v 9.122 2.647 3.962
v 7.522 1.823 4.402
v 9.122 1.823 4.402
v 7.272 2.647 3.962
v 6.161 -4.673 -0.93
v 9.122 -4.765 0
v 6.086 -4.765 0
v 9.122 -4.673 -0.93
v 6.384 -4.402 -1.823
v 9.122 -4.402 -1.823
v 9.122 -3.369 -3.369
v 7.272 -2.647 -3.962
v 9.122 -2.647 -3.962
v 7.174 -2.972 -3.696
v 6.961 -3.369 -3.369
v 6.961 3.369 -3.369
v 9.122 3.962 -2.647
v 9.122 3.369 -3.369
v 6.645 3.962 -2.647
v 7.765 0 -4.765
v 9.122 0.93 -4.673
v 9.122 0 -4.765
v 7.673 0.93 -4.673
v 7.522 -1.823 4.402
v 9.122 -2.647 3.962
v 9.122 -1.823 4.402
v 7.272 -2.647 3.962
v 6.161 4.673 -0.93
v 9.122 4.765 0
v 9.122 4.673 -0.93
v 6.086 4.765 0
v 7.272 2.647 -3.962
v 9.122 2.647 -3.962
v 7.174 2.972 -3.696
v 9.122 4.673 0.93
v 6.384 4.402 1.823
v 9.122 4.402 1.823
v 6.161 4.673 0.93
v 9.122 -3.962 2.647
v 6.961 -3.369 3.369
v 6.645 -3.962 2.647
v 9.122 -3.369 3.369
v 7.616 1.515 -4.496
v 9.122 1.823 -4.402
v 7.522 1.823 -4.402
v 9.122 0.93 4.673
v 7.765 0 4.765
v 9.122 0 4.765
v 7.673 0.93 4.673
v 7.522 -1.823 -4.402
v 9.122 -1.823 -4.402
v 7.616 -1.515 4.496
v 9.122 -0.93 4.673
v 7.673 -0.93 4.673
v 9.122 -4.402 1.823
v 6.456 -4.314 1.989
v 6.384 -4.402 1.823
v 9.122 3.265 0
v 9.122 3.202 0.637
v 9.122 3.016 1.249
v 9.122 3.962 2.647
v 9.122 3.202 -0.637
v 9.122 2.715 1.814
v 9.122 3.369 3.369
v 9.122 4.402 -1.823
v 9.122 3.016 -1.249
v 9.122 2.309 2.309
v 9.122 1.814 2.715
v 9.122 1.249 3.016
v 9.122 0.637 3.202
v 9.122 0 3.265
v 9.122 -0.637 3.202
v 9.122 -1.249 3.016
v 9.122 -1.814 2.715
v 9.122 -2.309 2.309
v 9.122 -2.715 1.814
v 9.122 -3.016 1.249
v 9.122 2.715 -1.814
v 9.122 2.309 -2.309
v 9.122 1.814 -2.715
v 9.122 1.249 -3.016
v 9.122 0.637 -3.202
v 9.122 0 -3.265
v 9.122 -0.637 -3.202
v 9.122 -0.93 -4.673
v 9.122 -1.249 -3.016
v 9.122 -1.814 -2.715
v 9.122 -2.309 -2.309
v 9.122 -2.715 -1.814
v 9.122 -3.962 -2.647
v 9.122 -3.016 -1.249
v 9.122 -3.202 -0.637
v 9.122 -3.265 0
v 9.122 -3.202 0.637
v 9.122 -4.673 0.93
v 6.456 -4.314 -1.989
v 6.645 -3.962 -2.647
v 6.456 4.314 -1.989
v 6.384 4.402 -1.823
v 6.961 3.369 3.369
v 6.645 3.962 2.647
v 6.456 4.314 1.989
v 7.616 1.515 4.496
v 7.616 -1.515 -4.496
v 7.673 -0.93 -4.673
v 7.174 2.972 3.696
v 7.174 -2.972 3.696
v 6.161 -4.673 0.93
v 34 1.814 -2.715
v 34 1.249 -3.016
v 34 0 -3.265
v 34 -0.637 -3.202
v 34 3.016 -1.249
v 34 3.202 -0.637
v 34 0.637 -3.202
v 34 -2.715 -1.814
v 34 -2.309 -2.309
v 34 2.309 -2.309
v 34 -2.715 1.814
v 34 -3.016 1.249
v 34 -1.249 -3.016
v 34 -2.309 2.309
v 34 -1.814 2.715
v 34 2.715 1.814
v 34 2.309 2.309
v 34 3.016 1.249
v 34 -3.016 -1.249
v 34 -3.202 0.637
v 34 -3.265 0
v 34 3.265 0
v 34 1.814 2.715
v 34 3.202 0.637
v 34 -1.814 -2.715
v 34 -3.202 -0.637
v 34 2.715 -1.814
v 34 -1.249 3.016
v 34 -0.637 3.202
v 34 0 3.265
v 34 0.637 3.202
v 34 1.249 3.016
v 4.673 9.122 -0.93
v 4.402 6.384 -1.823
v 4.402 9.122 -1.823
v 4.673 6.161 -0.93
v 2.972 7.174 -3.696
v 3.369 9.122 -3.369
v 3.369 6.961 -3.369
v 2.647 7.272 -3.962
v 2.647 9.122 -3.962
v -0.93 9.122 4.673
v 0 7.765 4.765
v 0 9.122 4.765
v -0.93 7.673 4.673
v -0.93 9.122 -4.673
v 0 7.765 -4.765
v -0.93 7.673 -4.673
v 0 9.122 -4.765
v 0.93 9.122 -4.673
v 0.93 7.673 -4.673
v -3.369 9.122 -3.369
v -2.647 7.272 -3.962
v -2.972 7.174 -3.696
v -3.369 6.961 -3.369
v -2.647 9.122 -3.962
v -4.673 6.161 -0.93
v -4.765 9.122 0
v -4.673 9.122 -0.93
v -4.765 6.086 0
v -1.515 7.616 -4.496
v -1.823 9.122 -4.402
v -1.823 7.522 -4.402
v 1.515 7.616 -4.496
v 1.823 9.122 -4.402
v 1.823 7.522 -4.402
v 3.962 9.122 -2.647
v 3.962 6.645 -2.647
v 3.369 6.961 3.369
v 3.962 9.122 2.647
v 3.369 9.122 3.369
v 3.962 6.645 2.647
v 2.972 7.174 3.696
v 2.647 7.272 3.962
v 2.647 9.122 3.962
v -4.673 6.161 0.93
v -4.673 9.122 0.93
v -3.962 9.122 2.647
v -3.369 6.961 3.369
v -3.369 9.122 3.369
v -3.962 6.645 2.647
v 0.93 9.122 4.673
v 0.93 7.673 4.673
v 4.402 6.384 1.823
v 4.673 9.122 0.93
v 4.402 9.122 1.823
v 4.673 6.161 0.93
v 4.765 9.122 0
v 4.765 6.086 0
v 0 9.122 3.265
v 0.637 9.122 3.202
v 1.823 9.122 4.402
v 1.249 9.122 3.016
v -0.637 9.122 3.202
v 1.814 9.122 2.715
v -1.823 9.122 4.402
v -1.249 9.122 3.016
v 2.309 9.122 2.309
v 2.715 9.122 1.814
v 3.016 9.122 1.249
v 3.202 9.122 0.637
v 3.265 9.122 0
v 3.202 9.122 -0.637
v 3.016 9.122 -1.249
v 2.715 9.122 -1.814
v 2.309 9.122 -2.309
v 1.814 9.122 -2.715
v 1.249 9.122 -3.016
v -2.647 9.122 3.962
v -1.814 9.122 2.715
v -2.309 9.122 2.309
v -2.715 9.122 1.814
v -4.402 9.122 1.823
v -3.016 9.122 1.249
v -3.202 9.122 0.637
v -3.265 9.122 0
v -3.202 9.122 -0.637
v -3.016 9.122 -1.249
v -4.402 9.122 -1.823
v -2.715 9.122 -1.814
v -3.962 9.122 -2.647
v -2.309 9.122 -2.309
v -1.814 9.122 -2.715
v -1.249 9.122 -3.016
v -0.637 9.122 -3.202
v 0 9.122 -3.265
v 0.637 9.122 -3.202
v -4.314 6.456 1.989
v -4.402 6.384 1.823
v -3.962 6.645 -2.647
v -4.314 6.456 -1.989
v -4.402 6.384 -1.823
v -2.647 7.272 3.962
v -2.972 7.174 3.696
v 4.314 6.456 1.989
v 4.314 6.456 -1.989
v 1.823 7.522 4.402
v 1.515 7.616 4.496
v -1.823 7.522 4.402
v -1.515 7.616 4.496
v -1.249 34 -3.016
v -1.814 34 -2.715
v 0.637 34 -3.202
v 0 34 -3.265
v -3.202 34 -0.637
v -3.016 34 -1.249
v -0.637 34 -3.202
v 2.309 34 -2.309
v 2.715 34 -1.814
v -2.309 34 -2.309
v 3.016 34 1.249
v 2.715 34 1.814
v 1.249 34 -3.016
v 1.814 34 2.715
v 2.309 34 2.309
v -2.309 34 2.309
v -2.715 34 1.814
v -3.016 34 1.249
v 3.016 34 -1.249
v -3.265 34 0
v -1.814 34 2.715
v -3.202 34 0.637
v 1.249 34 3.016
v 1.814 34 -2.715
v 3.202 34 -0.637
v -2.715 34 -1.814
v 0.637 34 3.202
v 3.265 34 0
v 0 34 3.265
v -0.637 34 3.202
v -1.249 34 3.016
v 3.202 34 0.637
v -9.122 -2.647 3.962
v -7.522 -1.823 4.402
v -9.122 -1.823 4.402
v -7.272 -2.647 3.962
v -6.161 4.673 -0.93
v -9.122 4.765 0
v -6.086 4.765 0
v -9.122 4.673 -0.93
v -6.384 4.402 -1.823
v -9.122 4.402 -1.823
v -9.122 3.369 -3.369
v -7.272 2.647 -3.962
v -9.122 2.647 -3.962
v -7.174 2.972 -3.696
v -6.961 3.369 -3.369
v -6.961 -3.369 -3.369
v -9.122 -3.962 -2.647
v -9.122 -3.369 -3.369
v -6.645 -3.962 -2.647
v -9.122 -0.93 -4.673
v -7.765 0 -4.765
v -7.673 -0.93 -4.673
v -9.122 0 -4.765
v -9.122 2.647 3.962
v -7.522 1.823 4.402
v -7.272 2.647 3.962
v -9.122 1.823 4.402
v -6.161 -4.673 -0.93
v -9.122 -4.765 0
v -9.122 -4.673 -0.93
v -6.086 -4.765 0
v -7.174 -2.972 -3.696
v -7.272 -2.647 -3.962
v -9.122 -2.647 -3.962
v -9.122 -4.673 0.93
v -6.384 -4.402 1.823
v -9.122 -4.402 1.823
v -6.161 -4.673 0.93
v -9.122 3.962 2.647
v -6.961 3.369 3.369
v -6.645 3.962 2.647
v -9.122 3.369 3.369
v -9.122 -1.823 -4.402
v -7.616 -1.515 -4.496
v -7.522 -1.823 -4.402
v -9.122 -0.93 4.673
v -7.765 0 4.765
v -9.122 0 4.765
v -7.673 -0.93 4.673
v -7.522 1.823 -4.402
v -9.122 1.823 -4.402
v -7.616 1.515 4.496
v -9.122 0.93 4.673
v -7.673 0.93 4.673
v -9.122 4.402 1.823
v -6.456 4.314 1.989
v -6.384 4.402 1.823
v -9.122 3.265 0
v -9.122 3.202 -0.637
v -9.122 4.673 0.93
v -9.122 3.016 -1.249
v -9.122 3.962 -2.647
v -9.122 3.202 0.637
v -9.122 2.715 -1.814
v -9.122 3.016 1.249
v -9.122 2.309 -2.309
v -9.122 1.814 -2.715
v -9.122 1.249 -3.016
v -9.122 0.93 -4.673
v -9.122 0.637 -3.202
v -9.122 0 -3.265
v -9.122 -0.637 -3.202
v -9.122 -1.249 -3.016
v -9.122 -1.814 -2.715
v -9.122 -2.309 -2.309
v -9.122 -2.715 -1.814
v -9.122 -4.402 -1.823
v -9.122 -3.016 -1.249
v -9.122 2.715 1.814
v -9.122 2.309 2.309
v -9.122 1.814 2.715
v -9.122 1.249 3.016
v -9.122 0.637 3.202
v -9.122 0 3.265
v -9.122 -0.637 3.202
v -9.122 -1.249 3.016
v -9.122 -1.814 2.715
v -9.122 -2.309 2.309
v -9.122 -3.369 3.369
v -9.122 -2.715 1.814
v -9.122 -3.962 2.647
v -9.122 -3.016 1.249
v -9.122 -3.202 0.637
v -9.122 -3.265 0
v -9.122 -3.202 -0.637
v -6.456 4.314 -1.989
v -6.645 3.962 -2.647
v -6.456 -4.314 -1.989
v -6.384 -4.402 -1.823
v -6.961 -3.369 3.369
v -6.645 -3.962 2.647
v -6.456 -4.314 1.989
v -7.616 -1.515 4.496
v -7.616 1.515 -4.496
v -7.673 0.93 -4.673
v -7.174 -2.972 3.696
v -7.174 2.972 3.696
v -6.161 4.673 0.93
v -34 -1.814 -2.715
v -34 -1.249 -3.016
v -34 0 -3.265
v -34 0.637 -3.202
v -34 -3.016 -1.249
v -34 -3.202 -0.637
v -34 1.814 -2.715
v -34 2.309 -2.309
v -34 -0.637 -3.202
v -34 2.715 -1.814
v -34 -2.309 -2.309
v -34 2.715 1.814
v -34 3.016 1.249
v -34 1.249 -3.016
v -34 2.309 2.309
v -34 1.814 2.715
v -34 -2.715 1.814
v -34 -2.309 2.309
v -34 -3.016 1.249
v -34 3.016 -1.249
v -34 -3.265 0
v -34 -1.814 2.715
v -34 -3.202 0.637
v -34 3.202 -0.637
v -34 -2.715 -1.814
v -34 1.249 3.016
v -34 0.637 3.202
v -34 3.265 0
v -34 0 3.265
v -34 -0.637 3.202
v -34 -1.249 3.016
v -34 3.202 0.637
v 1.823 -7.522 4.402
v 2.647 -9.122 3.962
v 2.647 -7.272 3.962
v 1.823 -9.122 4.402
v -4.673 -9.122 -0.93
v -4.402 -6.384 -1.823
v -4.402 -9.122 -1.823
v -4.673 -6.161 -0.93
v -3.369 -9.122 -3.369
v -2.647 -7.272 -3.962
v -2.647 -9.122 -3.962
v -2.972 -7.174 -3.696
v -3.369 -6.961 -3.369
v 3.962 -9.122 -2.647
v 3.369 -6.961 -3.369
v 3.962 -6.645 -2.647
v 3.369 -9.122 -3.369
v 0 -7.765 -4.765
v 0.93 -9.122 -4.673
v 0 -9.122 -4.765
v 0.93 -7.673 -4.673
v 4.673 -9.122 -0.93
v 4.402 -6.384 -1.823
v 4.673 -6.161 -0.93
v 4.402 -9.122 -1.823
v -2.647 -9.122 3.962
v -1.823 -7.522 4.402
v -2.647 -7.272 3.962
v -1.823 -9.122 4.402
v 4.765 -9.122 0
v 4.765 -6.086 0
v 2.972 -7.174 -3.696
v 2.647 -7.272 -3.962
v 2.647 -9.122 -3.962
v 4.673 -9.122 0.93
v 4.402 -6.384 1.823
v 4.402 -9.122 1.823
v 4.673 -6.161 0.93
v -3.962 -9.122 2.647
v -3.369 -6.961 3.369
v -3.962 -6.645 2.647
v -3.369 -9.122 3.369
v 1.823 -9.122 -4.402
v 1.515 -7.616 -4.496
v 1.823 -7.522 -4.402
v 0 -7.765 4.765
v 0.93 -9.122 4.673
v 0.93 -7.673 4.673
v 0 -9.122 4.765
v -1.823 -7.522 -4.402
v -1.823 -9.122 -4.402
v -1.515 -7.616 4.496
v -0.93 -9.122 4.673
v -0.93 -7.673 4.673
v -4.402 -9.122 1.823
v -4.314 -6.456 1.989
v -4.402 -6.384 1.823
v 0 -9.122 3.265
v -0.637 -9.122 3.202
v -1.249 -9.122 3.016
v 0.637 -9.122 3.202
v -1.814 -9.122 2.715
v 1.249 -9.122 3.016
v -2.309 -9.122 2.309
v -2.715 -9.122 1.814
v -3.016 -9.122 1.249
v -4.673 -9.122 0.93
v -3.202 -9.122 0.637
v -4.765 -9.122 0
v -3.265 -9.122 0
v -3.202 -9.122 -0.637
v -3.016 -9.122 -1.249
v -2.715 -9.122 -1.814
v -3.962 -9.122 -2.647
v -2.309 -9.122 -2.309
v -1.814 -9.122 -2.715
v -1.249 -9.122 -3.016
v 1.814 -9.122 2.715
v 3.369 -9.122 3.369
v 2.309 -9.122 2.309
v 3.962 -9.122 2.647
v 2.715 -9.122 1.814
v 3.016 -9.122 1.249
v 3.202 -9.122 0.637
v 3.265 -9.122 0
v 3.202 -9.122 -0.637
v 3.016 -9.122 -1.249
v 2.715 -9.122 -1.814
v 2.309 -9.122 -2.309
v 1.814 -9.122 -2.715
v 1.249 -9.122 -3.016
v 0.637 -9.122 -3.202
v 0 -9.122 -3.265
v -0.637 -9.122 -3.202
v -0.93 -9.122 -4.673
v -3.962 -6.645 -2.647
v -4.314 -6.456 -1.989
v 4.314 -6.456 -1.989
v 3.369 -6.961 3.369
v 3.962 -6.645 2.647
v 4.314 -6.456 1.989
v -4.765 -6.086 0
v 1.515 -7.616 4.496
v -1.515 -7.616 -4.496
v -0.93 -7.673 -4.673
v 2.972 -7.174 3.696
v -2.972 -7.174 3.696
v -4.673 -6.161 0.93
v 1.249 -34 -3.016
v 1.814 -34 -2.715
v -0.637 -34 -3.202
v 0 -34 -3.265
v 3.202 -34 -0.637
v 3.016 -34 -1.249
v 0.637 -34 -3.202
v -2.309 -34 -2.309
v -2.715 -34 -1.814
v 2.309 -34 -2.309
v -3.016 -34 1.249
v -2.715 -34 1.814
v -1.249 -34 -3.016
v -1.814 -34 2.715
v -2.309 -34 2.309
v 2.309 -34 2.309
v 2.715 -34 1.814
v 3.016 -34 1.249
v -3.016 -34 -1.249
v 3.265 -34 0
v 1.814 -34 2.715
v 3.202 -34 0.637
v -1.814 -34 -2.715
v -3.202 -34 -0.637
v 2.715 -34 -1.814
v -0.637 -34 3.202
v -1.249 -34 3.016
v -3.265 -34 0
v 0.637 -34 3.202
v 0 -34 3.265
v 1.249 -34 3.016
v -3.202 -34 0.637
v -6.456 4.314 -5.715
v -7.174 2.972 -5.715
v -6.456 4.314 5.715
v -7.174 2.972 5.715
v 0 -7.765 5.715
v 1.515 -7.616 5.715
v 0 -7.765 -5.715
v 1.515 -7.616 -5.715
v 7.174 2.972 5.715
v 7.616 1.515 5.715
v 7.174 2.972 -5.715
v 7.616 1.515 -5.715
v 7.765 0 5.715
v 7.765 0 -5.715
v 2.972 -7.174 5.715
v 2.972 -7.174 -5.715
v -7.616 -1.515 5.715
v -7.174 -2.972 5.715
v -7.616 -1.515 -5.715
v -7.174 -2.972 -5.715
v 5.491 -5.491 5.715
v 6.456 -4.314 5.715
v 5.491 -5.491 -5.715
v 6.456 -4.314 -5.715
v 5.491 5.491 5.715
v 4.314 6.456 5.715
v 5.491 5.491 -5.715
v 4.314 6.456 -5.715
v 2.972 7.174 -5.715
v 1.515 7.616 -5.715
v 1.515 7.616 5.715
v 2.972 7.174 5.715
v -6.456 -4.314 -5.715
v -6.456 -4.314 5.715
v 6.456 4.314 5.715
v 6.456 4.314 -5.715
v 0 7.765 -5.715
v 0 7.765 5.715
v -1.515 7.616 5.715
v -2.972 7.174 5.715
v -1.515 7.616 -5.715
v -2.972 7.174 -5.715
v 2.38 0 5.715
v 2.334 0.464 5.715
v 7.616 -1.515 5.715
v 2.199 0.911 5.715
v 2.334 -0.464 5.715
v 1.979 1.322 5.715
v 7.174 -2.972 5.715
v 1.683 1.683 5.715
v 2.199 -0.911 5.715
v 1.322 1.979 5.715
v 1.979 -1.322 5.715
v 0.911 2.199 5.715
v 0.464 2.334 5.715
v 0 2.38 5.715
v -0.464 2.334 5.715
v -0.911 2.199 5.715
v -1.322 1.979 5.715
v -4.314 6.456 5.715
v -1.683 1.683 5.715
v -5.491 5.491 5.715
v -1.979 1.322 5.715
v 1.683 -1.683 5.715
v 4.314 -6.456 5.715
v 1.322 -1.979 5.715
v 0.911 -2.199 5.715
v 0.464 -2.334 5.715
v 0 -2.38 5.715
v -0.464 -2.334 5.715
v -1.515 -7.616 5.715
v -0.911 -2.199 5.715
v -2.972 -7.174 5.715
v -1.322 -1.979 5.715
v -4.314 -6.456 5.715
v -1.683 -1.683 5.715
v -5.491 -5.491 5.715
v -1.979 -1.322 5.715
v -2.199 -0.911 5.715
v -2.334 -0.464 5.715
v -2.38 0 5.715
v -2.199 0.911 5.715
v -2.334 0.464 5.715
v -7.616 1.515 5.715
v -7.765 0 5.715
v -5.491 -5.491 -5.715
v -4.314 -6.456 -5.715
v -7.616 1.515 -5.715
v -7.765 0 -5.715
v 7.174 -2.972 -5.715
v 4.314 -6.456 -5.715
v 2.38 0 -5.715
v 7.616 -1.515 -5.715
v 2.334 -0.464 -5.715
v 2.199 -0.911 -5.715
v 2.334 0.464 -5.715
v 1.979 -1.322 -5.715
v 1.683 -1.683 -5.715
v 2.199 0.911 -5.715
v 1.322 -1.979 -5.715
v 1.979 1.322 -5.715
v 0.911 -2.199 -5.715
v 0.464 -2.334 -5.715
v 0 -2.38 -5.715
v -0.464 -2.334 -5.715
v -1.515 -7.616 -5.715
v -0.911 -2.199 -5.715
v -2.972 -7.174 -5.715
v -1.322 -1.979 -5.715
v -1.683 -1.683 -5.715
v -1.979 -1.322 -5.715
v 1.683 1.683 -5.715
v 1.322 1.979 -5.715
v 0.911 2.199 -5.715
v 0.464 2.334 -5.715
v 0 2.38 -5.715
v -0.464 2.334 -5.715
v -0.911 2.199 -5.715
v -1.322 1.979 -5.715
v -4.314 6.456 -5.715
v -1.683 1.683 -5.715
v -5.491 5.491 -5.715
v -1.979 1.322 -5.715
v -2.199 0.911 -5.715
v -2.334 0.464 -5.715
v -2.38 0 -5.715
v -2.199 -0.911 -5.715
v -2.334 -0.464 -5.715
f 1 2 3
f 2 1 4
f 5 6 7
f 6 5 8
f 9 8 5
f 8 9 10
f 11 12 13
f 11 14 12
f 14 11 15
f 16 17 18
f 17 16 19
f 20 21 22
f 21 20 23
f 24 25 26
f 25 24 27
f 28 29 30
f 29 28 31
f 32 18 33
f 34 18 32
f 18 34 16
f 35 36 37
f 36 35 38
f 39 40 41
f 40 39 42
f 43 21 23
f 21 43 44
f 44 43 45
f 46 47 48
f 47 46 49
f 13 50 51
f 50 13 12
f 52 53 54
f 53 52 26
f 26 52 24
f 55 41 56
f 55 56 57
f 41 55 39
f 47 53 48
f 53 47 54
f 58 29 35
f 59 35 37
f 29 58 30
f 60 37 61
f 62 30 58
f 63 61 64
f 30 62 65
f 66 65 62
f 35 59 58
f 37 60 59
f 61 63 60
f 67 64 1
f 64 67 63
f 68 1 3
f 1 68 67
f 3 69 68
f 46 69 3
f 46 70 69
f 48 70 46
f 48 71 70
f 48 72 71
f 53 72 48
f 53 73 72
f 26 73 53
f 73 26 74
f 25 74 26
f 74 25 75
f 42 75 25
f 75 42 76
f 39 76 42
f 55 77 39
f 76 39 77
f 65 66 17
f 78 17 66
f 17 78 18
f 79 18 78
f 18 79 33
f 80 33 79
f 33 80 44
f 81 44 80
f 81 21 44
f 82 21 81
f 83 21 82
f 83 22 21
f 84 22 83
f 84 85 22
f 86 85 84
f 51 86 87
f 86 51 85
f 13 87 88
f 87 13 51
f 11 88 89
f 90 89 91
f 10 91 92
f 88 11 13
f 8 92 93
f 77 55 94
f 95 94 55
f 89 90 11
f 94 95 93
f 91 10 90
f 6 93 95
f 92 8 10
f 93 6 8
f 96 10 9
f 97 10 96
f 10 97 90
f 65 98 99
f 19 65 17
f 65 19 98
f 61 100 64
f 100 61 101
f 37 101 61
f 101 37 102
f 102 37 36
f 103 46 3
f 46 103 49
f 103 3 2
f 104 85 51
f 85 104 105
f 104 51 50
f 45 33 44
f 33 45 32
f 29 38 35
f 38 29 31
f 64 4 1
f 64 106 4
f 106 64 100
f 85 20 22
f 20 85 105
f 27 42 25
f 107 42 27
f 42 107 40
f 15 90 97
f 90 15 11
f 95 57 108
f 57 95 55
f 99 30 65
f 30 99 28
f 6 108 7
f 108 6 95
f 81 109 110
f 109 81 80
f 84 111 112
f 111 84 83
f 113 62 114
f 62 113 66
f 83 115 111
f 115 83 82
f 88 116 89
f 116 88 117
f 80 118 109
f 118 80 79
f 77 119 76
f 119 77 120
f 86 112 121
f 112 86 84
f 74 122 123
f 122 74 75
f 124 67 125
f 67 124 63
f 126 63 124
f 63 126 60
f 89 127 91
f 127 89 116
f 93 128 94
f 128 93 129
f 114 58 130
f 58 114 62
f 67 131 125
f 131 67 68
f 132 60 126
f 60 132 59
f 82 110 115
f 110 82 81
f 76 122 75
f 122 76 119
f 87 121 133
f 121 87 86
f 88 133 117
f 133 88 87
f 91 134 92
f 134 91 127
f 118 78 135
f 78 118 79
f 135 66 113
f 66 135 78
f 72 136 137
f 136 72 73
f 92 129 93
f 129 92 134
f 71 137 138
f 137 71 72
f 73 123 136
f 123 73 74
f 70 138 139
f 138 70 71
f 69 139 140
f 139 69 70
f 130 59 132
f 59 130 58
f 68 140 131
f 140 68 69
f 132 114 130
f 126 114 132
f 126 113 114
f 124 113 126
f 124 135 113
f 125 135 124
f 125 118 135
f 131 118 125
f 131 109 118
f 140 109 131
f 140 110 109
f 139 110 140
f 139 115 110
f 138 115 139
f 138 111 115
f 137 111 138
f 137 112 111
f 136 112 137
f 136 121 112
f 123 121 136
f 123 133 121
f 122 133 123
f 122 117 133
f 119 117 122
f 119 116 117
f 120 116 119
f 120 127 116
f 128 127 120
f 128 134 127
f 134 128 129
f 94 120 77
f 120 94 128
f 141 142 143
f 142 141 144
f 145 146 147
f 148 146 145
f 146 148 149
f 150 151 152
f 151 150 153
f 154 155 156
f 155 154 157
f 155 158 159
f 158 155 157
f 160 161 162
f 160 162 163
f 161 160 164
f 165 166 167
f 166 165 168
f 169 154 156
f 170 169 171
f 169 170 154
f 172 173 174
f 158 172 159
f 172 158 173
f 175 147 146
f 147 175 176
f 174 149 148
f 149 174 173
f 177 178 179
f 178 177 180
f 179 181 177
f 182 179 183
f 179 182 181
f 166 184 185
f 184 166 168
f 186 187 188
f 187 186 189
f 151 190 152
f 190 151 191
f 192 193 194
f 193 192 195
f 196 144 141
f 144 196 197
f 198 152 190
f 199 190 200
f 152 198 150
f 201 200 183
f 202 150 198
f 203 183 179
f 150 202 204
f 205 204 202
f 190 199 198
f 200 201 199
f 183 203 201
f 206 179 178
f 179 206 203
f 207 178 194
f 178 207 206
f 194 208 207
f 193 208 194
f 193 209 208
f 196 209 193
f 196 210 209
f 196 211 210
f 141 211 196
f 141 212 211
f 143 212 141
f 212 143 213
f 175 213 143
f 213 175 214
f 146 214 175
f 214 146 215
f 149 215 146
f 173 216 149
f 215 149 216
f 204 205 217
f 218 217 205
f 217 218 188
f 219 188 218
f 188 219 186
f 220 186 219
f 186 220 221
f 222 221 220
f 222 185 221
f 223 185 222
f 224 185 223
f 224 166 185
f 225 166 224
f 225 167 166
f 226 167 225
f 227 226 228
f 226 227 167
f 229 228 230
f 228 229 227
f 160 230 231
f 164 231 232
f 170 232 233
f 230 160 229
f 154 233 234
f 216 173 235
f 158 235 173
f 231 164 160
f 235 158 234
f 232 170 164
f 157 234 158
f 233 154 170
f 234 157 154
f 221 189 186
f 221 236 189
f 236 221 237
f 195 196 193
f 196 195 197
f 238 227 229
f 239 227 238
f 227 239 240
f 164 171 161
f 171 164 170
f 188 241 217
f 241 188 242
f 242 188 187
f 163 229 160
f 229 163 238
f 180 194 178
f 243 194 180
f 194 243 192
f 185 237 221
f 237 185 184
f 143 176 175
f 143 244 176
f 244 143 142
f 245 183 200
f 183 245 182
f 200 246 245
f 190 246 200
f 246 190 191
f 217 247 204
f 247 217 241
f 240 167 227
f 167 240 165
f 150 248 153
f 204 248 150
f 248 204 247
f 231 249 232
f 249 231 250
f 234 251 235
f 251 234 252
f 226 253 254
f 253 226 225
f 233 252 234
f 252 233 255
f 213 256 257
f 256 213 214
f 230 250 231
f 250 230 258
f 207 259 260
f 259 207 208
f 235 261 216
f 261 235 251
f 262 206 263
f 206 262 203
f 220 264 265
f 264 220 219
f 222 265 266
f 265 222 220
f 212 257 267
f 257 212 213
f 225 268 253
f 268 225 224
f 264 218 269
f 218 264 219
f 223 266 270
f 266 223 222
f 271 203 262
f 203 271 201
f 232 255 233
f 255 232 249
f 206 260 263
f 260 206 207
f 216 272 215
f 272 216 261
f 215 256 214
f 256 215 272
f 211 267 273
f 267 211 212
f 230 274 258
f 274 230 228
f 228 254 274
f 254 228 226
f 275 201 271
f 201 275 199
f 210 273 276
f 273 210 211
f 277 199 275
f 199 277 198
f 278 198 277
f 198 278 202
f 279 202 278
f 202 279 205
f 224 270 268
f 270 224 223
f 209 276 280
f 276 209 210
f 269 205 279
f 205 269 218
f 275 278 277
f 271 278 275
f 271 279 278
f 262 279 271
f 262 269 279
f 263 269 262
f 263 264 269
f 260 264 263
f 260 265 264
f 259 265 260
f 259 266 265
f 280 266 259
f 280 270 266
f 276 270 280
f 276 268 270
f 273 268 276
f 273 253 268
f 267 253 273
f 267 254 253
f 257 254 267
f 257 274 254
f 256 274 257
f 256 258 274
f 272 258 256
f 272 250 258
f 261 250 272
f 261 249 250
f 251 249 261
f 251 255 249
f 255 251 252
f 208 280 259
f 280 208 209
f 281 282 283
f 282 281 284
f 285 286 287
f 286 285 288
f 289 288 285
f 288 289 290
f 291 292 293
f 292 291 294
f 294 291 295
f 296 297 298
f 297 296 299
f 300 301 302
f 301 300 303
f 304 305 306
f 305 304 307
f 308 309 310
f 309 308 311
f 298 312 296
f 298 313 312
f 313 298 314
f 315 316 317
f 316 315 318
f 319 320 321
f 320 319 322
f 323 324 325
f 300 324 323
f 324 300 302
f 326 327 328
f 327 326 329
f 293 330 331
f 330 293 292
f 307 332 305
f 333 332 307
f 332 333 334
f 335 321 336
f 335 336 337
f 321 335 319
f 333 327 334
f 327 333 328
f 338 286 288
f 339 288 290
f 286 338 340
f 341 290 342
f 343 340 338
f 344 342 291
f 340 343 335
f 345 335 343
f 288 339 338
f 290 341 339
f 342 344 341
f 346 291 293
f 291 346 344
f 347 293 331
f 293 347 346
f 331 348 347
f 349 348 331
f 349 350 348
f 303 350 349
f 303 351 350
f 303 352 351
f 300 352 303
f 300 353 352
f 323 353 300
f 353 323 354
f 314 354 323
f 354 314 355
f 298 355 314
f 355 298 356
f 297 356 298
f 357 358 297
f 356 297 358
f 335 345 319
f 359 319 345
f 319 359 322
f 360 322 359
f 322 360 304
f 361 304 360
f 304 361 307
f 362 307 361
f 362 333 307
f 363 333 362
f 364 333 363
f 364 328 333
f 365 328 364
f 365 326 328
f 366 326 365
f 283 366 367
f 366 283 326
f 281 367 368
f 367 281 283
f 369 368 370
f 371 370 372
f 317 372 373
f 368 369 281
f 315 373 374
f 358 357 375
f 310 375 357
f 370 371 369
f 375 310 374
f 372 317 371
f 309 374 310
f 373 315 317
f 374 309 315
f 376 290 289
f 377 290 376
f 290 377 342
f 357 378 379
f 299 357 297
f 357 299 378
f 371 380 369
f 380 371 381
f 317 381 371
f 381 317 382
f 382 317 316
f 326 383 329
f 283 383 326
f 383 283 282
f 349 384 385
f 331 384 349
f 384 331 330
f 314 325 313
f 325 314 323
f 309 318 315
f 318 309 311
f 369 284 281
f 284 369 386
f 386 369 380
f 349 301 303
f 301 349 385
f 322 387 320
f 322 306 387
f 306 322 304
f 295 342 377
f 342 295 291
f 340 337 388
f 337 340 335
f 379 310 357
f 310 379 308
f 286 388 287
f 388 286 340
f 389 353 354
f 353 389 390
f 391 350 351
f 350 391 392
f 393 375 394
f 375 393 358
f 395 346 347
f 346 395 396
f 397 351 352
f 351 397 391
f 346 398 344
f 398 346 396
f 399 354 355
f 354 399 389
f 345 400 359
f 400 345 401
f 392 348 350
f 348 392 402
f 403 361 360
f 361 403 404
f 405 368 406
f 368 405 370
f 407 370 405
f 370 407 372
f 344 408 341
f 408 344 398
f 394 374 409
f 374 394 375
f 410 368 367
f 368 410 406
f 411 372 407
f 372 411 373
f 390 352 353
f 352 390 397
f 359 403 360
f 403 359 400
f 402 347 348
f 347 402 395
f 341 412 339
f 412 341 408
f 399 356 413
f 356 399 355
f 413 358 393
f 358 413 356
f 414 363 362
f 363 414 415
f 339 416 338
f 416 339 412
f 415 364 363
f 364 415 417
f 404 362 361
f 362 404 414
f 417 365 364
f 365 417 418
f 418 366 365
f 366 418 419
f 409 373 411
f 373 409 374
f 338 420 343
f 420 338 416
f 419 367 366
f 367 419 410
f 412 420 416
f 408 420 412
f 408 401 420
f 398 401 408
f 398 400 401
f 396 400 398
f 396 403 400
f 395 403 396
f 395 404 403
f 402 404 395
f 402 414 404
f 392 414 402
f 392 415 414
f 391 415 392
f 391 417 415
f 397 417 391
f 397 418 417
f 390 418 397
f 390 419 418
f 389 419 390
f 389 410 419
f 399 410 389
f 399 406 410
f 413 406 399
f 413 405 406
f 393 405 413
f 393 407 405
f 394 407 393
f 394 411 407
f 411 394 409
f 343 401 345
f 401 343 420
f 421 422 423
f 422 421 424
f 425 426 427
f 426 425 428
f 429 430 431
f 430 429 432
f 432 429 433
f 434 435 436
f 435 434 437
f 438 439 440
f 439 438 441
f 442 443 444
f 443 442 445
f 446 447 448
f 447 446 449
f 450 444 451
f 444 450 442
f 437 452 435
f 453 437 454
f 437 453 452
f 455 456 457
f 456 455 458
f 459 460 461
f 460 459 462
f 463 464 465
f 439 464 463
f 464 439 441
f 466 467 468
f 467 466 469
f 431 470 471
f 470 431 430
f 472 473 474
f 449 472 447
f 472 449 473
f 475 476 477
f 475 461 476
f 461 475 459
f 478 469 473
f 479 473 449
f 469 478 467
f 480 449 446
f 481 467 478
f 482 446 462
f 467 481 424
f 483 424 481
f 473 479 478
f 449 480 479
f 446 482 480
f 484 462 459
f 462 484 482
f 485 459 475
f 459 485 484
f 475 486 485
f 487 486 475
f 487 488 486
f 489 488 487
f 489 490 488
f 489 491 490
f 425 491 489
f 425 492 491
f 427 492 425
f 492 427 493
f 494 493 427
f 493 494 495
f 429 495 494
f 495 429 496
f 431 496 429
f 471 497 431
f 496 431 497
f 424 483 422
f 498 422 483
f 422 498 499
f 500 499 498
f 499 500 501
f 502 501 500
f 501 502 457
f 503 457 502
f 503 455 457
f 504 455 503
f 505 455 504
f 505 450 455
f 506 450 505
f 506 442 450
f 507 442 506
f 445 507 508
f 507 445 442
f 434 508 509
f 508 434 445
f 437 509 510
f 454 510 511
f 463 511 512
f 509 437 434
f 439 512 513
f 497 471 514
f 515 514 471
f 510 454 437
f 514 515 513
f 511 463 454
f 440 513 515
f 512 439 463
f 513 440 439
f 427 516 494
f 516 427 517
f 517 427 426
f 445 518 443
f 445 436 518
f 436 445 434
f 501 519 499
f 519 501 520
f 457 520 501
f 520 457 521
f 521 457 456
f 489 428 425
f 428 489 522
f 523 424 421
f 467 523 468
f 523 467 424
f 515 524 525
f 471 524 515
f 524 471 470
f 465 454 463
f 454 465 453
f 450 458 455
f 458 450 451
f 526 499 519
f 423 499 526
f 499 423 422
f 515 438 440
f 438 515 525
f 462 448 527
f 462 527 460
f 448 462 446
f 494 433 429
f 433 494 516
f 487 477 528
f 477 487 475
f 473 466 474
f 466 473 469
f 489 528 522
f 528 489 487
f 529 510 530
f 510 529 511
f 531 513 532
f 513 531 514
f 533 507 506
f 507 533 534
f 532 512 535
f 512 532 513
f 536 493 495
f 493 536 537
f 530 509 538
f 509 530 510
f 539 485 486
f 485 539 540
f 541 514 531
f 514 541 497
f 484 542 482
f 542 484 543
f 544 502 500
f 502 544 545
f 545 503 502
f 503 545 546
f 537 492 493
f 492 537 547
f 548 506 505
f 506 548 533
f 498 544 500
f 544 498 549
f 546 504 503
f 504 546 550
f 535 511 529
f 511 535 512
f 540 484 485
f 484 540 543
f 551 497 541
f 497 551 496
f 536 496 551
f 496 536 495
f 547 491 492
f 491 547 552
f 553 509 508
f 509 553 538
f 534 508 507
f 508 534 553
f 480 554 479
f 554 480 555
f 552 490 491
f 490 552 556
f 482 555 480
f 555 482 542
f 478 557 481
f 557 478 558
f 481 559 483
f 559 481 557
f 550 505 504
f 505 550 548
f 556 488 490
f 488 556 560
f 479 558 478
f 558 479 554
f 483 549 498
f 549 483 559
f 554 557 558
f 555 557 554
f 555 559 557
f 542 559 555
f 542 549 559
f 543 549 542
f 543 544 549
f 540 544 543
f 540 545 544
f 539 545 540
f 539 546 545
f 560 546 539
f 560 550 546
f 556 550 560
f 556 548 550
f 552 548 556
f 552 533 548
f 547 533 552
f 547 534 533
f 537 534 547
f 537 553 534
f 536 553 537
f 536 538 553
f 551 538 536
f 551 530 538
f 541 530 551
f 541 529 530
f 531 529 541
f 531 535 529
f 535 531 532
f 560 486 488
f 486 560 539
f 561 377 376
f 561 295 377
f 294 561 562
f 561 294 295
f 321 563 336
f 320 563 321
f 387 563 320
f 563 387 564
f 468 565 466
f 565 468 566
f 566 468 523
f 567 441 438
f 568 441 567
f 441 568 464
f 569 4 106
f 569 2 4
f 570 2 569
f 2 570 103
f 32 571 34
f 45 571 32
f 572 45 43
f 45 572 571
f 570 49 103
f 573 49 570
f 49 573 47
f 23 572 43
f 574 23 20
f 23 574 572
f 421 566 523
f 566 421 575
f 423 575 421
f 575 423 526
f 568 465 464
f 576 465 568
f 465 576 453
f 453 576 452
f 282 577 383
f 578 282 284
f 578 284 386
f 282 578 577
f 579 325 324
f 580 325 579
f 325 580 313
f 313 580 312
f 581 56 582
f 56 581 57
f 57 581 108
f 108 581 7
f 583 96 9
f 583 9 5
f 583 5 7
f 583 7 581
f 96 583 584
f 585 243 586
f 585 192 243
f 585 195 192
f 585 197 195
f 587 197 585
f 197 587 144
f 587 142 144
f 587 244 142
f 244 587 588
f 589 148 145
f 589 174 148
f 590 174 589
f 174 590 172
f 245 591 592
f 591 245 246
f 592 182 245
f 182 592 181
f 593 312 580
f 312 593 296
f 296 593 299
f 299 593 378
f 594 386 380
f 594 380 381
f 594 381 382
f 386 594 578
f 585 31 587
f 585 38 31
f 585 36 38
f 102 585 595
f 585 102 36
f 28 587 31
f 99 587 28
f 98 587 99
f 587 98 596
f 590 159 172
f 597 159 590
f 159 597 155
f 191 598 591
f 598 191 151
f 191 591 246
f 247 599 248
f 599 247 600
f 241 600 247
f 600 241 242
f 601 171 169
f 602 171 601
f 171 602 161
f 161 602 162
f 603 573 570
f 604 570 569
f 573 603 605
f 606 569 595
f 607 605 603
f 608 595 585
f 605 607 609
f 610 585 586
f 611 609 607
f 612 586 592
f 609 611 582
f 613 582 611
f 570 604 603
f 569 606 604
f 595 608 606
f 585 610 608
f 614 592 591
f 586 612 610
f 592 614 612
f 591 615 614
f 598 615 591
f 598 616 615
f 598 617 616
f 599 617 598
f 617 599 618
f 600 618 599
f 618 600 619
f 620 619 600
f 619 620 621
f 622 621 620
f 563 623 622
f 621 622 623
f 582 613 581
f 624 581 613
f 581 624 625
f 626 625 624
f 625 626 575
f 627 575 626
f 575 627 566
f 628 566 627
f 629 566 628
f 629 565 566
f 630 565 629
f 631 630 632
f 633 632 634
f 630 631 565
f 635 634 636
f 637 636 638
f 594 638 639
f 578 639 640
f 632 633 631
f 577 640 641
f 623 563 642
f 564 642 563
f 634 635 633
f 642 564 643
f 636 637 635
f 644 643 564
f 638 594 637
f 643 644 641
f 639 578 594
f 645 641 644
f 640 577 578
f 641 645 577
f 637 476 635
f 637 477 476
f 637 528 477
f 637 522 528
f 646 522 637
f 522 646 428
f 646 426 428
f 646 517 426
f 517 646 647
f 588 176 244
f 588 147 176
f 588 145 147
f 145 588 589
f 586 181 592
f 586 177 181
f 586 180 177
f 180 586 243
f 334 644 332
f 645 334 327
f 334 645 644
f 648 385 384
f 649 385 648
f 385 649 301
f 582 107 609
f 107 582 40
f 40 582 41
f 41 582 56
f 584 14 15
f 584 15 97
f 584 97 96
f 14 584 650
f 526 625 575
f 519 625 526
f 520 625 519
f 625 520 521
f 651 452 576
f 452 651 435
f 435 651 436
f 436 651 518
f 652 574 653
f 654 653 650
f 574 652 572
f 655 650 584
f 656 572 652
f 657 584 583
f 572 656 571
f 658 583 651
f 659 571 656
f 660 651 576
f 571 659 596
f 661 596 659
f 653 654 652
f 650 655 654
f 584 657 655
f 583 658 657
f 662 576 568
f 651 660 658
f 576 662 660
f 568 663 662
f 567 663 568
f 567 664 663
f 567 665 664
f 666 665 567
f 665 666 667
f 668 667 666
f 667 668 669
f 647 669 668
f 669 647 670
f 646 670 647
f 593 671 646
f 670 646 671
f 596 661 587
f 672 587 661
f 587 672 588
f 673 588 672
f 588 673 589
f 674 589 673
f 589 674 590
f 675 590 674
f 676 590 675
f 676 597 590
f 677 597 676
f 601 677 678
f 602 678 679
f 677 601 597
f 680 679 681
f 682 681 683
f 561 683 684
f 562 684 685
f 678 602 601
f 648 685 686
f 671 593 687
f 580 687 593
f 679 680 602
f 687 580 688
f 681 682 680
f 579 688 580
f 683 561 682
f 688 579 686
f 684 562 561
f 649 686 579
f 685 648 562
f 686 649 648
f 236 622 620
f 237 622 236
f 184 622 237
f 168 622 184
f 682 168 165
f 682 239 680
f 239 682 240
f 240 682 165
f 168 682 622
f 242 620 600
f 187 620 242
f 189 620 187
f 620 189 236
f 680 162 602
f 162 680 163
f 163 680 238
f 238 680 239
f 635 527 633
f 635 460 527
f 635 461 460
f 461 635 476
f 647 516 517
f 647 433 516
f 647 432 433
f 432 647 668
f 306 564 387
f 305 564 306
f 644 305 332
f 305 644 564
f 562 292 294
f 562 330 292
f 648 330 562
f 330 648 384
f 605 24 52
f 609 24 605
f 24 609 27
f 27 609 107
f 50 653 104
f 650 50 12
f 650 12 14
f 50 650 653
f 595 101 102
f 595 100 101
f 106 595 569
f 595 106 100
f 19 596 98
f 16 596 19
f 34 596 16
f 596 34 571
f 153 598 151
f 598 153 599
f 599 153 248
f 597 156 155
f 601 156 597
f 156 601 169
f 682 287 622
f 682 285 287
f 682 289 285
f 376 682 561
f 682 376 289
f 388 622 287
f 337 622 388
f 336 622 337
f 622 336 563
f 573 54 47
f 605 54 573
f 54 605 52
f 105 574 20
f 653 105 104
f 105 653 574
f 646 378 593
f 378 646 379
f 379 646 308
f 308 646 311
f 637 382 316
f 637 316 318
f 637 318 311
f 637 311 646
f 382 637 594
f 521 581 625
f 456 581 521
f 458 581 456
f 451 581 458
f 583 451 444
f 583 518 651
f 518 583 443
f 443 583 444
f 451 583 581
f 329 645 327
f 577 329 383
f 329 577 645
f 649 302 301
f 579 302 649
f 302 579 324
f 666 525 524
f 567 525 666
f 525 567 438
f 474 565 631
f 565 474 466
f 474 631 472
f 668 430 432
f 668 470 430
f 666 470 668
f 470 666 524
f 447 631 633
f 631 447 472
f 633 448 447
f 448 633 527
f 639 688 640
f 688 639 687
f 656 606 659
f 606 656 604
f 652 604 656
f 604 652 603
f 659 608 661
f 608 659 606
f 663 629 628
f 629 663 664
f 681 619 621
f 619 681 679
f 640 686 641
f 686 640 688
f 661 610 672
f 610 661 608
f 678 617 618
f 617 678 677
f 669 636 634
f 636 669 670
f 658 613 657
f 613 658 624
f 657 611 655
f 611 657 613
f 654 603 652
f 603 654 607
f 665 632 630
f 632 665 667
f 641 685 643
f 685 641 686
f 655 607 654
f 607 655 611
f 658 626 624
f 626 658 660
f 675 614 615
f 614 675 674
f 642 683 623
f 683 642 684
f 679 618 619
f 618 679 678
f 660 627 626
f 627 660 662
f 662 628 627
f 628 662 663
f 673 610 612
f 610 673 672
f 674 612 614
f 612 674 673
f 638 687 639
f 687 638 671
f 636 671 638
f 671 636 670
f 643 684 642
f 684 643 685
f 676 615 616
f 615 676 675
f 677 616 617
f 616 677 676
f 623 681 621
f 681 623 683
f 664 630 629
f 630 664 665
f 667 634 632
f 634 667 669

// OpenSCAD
$fn = 32;

// ----------------------------------------------------------------------
// Cardan cross: 68 mm span, 9.53 mm trunnions
// ----------------------------------------------------------------------

// --- parameters (mm) ---
journal_d = 9.53;         // trunnion diameter
arm_len = 34;             // trunnion length from the centre
step_r = 3.24;            // step position from the centre
step_d = 6.53;            // journal diameter after the step
hub_d = 15.53;            // hub diameter
hub_h = 11.43;            // hub height
bore_d = 4.76;            // hub bore

difference() {
  union() {
    /* hub along the joint axis */
    cylinder(h = hub_h, d = hub_d, center = true);
    for (a = [0 : 90 : 270]) rotate([0, 0, a]) {
      /* trunnion, sunk into the hub */
      translate([hub_d / 4, 0, 0]) rotate([0, 90, 0]) cylinder(h = step_r + 2, d = journal_d);
      /* stepped journal out to the tip */
      translate([step_r - 0.5, 0, 0]) rotate([0, 90, 0]) cylinder(h = arm_len + 0.5 - step_r, d = step_d);
    }
  }
  /* lubrication bore through the hub, 2.5 mm clear on both sides */
  translate([0, 0, -hub_h / 2 - 2.5]) cylinder(h = hub_h + 5, d = bore_d);
}
